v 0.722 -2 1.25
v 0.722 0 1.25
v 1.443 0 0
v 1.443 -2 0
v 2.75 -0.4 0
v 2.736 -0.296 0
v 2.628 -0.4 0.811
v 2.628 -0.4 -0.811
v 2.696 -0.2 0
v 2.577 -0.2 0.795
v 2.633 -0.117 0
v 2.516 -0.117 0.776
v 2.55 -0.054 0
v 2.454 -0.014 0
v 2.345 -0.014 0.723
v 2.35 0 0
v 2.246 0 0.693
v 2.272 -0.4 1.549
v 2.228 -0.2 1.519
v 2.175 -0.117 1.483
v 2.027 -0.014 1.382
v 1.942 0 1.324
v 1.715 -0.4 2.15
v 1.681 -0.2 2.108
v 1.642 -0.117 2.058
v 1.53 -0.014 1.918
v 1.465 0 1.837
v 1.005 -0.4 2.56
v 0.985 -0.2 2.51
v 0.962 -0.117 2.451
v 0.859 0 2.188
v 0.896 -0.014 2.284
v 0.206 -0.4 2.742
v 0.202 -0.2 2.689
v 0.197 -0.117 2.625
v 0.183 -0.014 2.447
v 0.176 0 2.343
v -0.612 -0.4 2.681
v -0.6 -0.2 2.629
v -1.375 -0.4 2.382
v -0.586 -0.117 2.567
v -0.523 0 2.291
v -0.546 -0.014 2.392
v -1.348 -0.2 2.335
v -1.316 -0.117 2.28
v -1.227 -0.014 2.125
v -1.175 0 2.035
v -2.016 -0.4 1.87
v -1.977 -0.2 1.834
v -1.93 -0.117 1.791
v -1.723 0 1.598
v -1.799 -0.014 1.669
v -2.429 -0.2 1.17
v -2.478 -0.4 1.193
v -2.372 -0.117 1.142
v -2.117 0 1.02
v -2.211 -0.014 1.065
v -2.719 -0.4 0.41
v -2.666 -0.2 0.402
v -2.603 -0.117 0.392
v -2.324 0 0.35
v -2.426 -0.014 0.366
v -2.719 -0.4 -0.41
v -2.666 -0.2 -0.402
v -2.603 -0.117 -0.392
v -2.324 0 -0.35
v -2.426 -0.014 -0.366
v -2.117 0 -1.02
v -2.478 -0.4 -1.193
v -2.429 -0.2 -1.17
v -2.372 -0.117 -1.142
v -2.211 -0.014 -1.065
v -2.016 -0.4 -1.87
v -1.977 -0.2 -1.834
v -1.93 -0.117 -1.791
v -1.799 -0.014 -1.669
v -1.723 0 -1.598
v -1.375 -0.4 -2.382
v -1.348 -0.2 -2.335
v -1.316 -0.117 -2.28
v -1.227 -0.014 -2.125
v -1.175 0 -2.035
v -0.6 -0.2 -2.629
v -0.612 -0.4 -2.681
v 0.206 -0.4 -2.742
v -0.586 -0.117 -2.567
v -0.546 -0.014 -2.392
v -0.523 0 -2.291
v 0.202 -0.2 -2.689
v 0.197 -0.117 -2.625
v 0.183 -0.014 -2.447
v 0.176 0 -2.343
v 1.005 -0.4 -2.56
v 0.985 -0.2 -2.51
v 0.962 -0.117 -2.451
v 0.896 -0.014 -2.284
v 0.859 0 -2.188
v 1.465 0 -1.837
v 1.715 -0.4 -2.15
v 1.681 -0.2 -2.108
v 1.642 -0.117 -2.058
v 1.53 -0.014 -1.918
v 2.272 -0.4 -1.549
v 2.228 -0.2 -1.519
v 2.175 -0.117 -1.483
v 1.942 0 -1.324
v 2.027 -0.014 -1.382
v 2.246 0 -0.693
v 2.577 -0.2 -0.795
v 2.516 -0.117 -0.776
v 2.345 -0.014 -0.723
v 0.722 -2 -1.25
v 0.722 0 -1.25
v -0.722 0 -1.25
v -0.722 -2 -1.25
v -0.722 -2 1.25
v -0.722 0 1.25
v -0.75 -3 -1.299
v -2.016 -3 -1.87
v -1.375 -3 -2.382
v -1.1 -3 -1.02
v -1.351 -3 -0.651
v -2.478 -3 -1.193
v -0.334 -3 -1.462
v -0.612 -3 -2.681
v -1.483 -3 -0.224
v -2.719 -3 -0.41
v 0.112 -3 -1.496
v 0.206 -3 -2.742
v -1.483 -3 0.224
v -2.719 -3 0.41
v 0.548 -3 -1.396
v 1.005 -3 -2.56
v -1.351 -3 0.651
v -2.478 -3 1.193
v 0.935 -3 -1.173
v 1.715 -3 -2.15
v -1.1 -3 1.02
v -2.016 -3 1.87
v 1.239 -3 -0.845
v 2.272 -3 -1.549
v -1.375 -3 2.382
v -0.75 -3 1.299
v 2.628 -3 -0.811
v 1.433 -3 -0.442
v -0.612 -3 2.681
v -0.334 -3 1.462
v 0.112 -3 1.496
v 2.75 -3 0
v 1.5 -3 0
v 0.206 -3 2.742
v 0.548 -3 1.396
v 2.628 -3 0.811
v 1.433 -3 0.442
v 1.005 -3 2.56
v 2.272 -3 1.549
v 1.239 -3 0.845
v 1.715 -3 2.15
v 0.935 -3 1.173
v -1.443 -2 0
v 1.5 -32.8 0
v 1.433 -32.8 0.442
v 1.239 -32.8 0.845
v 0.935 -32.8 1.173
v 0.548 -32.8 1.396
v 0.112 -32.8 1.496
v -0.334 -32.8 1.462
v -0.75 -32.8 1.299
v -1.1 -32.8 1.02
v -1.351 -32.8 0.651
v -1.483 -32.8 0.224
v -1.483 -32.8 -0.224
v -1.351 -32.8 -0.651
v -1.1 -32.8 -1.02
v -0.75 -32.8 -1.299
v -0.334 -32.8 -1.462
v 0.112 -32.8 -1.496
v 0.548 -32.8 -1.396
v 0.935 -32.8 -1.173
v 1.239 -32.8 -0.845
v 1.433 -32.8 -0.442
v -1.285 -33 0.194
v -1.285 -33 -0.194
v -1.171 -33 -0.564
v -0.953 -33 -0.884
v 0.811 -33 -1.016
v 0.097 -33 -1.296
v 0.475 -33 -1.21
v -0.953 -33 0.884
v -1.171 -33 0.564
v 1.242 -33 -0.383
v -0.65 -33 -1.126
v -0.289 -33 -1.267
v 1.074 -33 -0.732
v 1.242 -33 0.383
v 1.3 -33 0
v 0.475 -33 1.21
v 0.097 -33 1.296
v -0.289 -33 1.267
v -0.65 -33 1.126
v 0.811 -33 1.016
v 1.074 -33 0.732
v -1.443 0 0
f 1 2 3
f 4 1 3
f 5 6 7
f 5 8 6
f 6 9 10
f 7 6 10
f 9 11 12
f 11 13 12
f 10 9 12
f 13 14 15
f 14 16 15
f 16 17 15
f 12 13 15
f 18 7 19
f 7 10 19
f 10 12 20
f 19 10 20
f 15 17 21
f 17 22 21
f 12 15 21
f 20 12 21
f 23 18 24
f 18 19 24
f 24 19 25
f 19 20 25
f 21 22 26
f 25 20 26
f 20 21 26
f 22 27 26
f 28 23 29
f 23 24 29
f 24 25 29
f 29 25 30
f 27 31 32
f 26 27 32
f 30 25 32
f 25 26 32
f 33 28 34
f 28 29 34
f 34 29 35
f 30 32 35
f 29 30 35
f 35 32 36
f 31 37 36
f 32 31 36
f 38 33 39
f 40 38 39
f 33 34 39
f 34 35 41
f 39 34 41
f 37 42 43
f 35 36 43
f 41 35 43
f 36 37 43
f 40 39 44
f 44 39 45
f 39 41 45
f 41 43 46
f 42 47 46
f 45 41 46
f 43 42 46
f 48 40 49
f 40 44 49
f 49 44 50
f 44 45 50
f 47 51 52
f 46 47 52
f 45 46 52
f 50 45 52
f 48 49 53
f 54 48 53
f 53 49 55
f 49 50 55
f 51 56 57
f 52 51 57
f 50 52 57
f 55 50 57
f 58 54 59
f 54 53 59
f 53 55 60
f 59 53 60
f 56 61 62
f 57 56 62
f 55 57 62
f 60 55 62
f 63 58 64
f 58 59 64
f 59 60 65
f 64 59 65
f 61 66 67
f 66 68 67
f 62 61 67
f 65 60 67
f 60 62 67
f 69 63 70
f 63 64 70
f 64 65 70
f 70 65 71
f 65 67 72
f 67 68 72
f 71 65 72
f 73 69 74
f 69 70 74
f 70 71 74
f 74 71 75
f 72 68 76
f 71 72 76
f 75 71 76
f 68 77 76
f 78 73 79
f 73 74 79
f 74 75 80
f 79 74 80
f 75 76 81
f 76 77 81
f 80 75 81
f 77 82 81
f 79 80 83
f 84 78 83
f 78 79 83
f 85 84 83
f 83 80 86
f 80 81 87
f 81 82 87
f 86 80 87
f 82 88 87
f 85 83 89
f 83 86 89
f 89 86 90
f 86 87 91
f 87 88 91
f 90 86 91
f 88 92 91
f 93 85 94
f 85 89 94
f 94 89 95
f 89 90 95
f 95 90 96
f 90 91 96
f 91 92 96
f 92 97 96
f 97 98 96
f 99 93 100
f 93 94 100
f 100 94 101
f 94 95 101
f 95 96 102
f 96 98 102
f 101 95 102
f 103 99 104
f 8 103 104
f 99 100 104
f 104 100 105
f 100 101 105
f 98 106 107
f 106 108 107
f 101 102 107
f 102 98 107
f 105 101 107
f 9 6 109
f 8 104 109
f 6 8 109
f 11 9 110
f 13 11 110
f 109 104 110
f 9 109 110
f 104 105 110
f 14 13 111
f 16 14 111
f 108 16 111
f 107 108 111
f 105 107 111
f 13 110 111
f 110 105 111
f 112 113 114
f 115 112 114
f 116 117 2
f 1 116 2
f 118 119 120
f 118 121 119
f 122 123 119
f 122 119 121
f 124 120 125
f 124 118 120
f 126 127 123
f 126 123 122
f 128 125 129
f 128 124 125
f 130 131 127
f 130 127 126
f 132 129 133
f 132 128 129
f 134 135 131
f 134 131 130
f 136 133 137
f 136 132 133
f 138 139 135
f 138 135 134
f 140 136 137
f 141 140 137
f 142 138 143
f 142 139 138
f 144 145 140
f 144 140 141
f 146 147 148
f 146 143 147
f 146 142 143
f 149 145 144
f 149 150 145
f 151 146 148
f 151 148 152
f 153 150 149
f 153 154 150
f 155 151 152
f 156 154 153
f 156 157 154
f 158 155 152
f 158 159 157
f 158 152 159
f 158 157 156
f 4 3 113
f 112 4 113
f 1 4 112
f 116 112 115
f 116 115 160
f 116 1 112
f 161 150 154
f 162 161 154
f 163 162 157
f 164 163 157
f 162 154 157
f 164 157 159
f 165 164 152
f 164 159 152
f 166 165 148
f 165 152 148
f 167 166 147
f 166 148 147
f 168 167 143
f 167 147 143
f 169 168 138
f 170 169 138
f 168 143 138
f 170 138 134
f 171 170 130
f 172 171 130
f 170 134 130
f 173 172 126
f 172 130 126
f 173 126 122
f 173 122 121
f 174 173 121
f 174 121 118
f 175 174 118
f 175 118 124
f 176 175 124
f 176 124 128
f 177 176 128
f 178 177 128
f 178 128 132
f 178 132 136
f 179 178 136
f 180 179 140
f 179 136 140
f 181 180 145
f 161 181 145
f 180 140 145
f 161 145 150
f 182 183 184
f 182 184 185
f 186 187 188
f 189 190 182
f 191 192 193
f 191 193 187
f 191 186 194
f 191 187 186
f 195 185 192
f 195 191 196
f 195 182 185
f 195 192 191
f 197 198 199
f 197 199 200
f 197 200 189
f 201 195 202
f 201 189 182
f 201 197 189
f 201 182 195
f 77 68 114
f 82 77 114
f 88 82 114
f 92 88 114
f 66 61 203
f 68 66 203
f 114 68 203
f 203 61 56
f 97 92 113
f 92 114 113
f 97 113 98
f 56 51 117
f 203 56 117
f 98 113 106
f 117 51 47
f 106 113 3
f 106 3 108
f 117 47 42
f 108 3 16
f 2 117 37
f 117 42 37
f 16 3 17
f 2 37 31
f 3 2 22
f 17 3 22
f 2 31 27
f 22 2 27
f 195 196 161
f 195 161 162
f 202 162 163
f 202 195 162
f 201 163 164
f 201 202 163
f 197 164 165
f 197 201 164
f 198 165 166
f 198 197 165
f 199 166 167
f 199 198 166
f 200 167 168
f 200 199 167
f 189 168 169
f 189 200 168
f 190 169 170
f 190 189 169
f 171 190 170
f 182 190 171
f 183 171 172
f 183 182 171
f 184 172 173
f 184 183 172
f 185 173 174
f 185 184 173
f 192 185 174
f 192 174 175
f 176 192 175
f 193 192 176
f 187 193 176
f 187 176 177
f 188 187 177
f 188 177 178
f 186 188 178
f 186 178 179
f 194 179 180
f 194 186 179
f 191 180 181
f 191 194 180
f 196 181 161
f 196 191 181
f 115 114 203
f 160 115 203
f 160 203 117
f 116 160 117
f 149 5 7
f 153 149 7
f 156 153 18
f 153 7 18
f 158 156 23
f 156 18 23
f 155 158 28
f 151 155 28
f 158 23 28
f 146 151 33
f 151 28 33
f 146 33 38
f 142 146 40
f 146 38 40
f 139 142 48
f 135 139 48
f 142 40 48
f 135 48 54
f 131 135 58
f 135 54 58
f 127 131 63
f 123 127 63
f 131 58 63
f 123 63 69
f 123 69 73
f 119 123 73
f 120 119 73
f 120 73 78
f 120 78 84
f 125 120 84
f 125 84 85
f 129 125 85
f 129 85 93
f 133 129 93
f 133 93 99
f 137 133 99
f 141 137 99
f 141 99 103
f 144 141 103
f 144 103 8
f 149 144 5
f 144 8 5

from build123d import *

# Parameters (mm, degrees)
F0_R     = 2.75
F1_DEPTH = 3
F2_R     = 1.5
F3_DEPTH = 30
F4_SIZE  = 0.2
F6_DEPTH = 2
F7_R     = 0.4


with BuildPart() as f1:
    # F0 (on Front) → F1 (new body)
    with BuildSketch(Plane.XZ):
        Circle(F0_R)
    extrude(amount=F1_DEPTH)

    # F2 (on face) → F3 (join)
    with BuildSketch(Plane.XZ.offset(3)):
        Circle(F2_R)
    extrude(amount=F3_DEPTH)

    # F4
    f4_edges = [f1.edges().sort_by_distance(p)[0] for p in [
        (-1.5, -33, 0),
    ]]
    chamfer(f4_edges, length=F4_SIZE)

    # F5 (on face) → F6 (cut)
    with BuildSketch(Plane(origin=(0, 0, 0), x_dir=(-1, 0, 0), z_dir=(0, 1, 0))):
        Polygon((1.443376, 0), (0.721688, 1.25), (-0.721688, 1.25), (-1.443376, 0), (-0.721688, -1.25), (0.721688, -1.25), align=None)
    extrude(amount=-F6_DEPTH, mode=Mode.SUBTRACT)

    # F7
    f7_edges = [f1.edges().sort_by_distance(p)[0] for p in [
        (-2.75, 0, 0),
    ]]
    fillet(f7_edges, radius=F7_R)


solid = f1.part
